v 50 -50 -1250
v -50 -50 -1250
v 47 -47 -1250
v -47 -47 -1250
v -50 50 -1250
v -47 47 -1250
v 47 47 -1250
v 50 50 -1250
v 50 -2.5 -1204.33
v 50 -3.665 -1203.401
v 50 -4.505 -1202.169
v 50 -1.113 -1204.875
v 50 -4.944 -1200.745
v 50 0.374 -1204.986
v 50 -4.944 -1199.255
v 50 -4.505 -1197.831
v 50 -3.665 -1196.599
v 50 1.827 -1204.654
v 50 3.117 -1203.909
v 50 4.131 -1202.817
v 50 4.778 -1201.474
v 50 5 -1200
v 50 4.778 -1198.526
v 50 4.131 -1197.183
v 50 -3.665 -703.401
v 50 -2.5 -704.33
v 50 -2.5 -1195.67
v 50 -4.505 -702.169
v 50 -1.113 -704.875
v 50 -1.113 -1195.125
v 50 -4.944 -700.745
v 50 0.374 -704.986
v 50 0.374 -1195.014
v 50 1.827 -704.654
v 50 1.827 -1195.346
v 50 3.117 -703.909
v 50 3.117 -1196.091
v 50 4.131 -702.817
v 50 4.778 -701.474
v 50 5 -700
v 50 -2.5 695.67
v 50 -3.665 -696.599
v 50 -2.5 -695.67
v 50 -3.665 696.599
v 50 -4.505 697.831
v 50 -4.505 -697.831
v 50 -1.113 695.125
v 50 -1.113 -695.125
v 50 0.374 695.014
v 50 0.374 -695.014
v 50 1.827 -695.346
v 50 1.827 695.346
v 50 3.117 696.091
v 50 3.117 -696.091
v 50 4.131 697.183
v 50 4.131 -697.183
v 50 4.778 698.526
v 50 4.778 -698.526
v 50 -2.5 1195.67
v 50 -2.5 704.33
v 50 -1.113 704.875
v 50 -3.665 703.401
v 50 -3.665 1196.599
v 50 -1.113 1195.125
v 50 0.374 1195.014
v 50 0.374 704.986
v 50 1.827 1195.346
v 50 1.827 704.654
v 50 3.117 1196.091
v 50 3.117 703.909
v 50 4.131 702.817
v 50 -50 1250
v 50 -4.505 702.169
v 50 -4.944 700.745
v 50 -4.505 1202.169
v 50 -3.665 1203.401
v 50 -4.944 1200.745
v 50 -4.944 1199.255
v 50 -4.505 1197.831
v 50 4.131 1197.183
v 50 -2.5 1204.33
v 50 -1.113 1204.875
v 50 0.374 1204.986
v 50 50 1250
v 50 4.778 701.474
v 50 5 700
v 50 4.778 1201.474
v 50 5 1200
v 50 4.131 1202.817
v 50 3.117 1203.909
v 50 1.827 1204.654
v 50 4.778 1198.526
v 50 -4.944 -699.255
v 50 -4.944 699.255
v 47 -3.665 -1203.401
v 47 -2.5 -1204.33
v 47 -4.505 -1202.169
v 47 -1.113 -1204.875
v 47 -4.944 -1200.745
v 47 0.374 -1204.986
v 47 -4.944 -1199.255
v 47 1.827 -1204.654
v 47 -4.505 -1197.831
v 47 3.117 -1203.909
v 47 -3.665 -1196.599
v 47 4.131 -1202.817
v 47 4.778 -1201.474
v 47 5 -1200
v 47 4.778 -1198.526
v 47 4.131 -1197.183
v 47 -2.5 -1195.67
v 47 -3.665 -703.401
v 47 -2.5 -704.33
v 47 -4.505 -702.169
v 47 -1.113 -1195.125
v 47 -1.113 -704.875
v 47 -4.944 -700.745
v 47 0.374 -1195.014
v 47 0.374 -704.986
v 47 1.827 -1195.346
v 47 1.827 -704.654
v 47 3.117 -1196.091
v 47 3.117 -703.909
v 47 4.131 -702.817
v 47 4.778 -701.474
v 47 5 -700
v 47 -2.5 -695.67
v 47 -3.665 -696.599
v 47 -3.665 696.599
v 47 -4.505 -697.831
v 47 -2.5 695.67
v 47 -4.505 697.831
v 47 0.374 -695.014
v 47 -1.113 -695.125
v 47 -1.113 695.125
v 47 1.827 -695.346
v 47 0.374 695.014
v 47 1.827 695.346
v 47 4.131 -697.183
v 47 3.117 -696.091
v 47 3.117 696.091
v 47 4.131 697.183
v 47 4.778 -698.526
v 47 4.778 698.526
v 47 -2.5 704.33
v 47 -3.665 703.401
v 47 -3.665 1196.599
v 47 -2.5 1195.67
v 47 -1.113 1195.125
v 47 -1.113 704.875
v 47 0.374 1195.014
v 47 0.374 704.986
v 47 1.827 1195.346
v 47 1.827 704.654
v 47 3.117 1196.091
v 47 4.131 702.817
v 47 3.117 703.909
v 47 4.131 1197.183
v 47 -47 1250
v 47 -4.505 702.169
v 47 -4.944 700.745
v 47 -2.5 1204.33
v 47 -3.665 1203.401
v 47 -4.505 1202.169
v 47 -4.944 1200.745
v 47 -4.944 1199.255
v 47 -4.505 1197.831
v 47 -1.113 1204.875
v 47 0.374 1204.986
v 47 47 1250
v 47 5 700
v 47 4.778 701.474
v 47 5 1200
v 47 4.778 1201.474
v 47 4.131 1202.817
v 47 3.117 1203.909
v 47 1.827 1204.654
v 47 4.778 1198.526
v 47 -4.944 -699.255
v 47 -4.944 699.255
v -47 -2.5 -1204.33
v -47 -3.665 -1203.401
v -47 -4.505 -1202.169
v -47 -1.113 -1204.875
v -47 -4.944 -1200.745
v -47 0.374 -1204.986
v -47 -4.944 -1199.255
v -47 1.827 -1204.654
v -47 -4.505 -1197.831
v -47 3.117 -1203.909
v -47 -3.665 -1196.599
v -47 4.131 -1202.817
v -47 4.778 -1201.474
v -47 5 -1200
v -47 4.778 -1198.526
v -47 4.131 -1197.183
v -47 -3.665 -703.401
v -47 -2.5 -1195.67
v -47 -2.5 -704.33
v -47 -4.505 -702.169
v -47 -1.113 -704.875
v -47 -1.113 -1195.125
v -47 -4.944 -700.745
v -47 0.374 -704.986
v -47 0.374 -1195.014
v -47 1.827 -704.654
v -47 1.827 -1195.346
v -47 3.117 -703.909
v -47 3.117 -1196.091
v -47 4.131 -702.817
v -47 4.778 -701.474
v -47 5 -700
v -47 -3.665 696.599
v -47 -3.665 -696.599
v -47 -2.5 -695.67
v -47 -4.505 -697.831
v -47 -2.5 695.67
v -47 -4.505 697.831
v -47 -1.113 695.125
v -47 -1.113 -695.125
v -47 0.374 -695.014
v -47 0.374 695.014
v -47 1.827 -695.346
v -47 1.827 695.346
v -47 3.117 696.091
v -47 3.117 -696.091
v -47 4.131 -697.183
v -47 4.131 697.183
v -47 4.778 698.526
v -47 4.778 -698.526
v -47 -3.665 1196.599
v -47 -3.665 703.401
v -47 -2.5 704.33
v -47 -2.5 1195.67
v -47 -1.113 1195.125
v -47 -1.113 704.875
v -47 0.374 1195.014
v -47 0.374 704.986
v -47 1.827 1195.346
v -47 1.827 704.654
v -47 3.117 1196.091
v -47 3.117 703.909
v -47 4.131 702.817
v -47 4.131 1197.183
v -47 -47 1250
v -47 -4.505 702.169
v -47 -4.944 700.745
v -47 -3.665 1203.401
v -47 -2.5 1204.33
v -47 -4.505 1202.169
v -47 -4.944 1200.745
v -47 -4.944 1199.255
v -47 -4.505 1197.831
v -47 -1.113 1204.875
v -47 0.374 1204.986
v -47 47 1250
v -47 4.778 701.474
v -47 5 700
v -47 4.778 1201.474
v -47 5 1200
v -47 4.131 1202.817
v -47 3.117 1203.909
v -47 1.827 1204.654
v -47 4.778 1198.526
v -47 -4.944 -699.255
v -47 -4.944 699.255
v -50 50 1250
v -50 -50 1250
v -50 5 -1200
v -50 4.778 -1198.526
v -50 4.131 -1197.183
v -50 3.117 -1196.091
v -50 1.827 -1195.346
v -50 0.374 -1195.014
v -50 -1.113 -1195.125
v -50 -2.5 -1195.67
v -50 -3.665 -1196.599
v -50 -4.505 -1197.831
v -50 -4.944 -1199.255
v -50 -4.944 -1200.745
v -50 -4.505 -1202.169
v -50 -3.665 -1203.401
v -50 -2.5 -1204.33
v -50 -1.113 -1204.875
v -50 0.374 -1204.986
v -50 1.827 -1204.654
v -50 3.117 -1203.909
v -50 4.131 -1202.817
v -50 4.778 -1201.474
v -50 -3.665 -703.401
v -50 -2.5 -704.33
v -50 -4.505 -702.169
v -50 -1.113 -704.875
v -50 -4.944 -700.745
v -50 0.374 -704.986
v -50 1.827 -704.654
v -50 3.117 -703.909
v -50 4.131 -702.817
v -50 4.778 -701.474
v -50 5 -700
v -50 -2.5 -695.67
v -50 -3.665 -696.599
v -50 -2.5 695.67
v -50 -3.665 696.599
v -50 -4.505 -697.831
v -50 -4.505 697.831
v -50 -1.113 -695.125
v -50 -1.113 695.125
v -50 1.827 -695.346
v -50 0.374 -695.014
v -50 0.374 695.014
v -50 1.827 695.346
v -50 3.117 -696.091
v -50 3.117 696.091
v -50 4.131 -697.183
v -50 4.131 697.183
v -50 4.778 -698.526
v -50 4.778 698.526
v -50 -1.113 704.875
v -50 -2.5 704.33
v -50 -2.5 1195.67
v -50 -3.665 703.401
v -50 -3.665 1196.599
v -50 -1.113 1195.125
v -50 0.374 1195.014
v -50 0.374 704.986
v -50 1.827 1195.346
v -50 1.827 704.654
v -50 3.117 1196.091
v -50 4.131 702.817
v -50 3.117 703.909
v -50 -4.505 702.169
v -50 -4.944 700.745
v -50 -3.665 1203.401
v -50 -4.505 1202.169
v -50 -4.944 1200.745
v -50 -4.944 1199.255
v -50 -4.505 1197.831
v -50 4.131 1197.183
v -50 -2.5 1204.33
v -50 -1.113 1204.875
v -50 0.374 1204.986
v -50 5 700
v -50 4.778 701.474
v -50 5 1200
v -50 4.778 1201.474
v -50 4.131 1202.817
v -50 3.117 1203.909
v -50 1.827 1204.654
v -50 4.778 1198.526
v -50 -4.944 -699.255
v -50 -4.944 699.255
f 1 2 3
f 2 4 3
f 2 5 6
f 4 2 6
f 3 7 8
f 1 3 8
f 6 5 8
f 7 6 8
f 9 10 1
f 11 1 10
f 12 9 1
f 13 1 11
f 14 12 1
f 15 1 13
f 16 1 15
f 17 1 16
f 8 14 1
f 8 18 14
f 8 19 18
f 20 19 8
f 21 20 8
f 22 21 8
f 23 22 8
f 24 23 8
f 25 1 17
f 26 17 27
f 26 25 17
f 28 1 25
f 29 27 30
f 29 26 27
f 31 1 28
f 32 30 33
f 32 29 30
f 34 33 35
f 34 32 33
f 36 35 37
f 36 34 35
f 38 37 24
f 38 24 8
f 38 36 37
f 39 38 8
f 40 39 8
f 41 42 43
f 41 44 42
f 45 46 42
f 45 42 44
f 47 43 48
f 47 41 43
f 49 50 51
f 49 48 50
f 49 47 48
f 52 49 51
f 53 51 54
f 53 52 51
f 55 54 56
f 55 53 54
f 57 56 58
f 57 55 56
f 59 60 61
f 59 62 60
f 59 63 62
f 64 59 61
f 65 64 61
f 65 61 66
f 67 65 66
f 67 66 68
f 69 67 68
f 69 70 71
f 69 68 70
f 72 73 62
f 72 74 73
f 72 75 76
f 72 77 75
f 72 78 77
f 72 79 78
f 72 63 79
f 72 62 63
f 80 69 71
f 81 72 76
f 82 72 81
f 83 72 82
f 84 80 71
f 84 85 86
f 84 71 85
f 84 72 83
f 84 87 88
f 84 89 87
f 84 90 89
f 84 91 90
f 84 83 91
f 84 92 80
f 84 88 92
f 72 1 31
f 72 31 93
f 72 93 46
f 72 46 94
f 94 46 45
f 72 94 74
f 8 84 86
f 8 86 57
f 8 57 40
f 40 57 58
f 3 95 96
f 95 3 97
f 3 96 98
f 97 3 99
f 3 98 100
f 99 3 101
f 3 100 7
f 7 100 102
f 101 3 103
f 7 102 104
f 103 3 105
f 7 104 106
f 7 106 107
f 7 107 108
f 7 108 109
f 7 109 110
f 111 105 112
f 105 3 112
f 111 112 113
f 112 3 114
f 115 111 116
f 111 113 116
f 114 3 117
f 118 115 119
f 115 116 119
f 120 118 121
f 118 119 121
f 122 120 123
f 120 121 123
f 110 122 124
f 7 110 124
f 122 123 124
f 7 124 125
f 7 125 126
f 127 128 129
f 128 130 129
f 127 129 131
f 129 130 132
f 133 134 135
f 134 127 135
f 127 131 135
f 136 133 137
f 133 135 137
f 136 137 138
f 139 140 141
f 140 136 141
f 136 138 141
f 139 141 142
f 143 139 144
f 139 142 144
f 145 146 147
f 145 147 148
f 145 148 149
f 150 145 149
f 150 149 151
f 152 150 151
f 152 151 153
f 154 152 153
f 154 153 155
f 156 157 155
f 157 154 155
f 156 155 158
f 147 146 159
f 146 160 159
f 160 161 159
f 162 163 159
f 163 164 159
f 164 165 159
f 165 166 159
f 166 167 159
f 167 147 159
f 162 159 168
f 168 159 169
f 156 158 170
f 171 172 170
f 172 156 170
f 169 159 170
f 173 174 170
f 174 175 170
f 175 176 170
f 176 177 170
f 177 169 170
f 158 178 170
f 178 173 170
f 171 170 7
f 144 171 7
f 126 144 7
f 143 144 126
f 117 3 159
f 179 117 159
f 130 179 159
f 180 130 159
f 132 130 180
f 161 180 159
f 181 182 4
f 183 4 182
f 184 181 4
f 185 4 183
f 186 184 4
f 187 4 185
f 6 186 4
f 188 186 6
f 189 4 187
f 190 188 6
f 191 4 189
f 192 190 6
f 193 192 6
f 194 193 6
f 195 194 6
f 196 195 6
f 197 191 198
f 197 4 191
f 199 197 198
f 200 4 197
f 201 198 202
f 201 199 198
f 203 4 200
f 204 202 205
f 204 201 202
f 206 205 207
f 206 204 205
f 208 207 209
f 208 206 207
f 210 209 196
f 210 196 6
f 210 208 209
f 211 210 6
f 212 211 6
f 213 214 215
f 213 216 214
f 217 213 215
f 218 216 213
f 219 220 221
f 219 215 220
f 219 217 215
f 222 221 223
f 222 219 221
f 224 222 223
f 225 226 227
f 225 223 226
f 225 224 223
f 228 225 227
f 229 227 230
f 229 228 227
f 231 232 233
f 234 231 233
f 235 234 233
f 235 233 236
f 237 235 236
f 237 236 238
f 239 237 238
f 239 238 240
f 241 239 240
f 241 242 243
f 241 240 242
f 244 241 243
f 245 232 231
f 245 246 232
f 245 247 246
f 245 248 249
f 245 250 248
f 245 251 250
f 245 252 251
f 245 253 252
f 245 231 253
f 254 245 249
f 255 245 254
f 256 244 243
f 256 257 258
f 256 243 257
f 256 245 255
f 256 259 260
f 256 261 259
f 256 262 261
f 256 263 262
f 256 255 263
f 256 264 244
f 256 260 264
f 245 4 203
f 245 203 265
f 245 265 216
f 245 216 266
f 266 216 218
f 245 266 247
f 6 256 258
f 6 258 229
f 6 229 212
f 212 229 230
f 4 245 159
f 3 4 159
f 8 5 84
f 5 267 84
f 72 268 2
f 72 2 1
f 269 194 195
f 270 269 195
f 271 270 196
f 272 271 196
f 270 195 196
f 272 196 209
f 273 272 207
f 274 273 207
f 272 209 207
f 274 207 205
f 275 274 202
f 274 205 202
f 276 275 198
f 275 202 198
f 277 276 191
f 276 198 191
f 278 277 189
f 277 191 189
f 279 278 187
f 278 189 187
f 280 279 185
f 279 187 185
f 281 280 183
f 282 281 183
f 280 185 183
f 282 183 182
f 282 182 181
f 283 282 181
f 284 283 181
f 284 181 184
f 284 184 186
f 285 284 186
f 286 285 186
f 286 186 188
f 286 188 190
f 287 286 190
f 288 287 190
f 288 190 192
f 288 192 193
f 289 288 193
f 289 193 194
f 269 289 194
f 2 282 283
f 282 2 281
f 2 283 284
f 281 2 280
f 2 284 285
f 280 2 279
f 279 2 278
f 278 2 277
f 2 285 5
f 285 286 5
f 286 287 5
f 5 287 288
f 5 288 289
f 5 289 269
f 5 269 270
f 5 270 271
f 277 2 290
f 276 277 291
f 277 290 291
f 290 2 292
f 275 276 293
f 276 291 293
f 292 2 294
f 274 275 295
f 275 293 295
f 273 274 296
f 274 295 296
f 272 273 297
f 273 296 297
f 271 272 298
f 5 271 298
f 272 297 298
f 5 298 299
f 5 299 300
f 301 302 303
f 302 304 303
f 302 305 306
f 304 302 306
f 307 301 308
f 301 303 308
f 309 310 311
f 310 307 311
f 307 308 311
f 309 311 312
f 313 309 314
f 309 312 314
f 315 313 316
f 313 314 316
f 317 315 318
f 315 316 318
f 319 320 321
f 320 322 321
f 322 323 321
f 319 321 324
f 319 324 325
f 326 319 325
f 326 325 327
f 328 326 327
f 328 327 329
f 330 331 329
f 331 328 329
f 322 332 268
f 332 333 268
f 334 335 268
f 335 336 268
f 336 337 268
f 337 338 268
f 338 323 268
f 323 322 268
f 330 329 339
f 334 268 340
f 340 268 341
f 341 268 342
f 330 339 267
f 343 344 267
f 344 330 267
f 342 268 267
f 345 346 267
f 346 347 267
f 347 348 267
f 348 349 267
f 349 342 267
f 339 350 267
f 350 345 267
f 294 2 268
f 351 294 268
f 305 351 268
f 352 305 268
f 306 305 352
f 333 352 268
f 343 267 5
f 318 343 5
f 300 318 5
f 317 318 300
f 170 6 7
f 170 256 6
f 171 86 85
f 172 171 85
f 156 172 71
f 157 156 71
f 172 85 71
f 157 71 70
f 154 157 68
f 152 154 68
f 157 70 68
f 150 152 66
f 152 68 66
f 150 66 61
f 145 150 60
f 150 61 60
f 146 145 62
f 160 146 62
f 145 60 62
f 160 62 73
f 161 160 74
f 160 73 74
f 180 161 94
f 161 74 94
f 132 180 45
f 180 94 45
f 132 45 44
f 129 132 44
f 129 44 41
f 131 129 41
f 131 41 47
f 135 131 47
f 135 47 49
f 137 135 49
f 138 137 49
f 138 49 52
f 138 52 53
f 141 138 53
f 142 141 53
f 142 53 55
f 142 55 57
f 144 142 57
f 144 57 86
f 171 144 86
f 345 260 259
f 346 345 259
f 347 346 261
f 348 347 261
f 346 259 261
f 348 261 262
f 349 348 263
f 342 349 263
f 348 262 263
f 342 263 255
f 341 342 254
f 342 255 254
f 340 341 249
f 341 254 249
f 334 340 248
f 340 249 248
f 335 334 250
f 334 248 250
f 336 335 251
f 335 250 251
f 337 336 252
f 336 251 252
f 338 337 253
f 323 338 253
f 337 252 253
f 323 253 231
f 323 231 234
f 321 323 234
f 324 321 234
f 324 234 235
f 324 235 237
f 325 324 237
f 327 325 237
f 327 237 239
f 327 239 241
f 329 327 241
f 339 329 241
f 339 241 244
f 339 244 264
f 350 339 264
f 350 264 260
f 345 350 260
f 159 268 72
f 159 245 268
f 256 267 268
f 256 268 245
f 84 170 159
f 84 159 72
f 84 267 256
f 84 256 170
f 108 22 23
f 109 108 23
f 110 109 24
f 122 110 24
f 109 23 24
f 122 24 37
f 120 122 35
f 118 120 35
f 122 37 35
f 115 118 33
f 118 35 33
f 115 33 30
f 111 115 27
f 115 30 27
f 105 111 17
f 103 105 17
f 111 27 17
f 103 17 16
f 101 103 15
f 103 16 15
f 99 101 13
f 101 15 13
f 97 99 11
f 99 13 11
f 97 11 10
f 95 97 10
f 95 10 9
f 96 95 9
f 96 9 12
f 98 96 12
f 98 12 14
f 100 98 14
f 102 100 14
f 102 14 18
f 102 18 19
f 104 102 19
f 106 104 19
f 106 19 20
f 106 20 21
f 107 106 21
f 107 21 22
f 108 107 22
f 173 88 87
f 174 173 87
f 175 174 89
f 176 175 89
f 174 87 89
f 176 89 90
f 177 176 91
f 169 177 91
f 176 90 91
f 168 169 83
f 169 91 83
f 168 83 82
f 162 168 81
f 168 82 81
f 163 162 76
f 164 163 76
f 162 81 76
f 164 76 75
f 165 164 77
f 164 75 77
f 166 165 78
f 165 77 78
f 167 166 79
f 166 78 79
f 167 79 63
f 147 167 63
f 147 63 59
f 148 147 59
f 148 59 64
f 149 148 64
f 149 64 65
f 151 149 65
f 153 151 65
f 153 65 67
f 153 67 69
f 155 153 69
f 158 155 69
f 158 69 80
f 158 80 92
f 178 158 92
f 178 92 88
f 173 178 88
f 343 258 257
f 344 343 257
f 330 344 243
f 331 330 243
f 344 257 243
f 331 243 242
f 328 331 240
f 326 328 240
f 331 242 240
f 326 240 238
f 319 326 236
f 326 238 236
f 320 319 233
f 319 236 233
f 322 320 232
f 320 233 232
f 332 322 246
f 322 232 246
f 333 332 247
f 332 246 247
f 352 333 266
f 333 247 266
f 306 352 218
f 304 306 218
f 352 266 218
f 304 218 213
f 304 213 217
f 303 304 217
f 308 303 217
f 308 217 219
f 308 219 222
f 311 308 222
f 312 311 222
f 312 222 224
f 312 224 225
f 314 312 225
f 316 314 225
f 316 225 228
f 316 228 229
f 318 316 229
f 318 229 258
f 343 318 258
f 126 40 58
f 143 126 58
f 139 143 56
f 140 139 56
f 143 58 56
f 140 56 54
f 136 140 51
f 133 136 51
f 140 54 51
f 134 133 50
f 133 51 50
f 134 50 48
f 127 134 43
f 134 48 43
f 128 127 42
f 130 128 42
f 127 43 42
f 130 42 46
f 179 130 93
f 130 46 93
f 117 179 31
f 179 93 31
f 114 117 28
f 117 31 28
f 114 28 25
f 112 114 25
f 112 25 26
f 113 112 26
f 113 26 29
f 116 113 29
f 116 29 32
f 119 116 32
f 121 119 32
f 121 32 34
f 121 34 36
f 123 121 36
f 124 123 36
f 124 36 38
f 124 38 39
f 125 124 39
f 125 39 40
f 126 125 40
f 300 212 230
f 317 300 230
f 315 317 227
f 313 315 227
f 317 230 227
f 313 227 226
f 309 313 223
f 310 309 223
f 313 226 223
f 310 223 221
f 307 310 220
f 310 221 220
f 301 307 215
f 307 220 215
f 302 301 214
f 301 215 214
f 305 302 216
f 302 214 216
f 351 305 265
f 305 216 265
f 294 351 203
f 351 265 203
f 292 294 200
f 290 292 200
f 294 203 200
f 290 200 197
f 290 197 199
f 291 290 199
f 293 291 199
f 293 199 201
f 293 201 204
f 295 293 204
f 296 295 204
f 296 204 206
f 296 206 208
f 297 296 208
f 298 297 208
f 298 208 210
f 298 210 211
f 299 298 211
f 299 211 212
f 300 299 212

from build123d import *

# Parameters (mm, degrees)
F0_W     = 100
F0_H     = 100
F0_W_2   = 94
F0_H_2   = 94
F1_DEPTH = 1250
F2_R     = 5
F3_DEPTH = 300


with BuildPart() as f1:
    # F0 (on Top) → F1 (new body, symmetric)
    with BuildSketch(Plane.XY):
        Rectangle(F0_W, F0_H)
        Rectangle(F0_W_2, F0_H_2, mode=Mode.SUBTRACT)
    extrude(amount=F1_DEPTH, both=True)

    # F2 (on face) → F3 (cut)
    with BuildSketch(Plane.YZ.offset(50)):
        with Locations((0, 1200)):
            Circle(F2_R)
        with Locations((0, 700)):
            Circle(F2_R)
        with Locations((0, -700)):
            Circle(F2_R)
        with Locations((0, -1200)):
            Circle(F2_R)
    extrude(amount=-F3_DEPTH, mode=Mode.SUBTRACT)


solid = f1.part
